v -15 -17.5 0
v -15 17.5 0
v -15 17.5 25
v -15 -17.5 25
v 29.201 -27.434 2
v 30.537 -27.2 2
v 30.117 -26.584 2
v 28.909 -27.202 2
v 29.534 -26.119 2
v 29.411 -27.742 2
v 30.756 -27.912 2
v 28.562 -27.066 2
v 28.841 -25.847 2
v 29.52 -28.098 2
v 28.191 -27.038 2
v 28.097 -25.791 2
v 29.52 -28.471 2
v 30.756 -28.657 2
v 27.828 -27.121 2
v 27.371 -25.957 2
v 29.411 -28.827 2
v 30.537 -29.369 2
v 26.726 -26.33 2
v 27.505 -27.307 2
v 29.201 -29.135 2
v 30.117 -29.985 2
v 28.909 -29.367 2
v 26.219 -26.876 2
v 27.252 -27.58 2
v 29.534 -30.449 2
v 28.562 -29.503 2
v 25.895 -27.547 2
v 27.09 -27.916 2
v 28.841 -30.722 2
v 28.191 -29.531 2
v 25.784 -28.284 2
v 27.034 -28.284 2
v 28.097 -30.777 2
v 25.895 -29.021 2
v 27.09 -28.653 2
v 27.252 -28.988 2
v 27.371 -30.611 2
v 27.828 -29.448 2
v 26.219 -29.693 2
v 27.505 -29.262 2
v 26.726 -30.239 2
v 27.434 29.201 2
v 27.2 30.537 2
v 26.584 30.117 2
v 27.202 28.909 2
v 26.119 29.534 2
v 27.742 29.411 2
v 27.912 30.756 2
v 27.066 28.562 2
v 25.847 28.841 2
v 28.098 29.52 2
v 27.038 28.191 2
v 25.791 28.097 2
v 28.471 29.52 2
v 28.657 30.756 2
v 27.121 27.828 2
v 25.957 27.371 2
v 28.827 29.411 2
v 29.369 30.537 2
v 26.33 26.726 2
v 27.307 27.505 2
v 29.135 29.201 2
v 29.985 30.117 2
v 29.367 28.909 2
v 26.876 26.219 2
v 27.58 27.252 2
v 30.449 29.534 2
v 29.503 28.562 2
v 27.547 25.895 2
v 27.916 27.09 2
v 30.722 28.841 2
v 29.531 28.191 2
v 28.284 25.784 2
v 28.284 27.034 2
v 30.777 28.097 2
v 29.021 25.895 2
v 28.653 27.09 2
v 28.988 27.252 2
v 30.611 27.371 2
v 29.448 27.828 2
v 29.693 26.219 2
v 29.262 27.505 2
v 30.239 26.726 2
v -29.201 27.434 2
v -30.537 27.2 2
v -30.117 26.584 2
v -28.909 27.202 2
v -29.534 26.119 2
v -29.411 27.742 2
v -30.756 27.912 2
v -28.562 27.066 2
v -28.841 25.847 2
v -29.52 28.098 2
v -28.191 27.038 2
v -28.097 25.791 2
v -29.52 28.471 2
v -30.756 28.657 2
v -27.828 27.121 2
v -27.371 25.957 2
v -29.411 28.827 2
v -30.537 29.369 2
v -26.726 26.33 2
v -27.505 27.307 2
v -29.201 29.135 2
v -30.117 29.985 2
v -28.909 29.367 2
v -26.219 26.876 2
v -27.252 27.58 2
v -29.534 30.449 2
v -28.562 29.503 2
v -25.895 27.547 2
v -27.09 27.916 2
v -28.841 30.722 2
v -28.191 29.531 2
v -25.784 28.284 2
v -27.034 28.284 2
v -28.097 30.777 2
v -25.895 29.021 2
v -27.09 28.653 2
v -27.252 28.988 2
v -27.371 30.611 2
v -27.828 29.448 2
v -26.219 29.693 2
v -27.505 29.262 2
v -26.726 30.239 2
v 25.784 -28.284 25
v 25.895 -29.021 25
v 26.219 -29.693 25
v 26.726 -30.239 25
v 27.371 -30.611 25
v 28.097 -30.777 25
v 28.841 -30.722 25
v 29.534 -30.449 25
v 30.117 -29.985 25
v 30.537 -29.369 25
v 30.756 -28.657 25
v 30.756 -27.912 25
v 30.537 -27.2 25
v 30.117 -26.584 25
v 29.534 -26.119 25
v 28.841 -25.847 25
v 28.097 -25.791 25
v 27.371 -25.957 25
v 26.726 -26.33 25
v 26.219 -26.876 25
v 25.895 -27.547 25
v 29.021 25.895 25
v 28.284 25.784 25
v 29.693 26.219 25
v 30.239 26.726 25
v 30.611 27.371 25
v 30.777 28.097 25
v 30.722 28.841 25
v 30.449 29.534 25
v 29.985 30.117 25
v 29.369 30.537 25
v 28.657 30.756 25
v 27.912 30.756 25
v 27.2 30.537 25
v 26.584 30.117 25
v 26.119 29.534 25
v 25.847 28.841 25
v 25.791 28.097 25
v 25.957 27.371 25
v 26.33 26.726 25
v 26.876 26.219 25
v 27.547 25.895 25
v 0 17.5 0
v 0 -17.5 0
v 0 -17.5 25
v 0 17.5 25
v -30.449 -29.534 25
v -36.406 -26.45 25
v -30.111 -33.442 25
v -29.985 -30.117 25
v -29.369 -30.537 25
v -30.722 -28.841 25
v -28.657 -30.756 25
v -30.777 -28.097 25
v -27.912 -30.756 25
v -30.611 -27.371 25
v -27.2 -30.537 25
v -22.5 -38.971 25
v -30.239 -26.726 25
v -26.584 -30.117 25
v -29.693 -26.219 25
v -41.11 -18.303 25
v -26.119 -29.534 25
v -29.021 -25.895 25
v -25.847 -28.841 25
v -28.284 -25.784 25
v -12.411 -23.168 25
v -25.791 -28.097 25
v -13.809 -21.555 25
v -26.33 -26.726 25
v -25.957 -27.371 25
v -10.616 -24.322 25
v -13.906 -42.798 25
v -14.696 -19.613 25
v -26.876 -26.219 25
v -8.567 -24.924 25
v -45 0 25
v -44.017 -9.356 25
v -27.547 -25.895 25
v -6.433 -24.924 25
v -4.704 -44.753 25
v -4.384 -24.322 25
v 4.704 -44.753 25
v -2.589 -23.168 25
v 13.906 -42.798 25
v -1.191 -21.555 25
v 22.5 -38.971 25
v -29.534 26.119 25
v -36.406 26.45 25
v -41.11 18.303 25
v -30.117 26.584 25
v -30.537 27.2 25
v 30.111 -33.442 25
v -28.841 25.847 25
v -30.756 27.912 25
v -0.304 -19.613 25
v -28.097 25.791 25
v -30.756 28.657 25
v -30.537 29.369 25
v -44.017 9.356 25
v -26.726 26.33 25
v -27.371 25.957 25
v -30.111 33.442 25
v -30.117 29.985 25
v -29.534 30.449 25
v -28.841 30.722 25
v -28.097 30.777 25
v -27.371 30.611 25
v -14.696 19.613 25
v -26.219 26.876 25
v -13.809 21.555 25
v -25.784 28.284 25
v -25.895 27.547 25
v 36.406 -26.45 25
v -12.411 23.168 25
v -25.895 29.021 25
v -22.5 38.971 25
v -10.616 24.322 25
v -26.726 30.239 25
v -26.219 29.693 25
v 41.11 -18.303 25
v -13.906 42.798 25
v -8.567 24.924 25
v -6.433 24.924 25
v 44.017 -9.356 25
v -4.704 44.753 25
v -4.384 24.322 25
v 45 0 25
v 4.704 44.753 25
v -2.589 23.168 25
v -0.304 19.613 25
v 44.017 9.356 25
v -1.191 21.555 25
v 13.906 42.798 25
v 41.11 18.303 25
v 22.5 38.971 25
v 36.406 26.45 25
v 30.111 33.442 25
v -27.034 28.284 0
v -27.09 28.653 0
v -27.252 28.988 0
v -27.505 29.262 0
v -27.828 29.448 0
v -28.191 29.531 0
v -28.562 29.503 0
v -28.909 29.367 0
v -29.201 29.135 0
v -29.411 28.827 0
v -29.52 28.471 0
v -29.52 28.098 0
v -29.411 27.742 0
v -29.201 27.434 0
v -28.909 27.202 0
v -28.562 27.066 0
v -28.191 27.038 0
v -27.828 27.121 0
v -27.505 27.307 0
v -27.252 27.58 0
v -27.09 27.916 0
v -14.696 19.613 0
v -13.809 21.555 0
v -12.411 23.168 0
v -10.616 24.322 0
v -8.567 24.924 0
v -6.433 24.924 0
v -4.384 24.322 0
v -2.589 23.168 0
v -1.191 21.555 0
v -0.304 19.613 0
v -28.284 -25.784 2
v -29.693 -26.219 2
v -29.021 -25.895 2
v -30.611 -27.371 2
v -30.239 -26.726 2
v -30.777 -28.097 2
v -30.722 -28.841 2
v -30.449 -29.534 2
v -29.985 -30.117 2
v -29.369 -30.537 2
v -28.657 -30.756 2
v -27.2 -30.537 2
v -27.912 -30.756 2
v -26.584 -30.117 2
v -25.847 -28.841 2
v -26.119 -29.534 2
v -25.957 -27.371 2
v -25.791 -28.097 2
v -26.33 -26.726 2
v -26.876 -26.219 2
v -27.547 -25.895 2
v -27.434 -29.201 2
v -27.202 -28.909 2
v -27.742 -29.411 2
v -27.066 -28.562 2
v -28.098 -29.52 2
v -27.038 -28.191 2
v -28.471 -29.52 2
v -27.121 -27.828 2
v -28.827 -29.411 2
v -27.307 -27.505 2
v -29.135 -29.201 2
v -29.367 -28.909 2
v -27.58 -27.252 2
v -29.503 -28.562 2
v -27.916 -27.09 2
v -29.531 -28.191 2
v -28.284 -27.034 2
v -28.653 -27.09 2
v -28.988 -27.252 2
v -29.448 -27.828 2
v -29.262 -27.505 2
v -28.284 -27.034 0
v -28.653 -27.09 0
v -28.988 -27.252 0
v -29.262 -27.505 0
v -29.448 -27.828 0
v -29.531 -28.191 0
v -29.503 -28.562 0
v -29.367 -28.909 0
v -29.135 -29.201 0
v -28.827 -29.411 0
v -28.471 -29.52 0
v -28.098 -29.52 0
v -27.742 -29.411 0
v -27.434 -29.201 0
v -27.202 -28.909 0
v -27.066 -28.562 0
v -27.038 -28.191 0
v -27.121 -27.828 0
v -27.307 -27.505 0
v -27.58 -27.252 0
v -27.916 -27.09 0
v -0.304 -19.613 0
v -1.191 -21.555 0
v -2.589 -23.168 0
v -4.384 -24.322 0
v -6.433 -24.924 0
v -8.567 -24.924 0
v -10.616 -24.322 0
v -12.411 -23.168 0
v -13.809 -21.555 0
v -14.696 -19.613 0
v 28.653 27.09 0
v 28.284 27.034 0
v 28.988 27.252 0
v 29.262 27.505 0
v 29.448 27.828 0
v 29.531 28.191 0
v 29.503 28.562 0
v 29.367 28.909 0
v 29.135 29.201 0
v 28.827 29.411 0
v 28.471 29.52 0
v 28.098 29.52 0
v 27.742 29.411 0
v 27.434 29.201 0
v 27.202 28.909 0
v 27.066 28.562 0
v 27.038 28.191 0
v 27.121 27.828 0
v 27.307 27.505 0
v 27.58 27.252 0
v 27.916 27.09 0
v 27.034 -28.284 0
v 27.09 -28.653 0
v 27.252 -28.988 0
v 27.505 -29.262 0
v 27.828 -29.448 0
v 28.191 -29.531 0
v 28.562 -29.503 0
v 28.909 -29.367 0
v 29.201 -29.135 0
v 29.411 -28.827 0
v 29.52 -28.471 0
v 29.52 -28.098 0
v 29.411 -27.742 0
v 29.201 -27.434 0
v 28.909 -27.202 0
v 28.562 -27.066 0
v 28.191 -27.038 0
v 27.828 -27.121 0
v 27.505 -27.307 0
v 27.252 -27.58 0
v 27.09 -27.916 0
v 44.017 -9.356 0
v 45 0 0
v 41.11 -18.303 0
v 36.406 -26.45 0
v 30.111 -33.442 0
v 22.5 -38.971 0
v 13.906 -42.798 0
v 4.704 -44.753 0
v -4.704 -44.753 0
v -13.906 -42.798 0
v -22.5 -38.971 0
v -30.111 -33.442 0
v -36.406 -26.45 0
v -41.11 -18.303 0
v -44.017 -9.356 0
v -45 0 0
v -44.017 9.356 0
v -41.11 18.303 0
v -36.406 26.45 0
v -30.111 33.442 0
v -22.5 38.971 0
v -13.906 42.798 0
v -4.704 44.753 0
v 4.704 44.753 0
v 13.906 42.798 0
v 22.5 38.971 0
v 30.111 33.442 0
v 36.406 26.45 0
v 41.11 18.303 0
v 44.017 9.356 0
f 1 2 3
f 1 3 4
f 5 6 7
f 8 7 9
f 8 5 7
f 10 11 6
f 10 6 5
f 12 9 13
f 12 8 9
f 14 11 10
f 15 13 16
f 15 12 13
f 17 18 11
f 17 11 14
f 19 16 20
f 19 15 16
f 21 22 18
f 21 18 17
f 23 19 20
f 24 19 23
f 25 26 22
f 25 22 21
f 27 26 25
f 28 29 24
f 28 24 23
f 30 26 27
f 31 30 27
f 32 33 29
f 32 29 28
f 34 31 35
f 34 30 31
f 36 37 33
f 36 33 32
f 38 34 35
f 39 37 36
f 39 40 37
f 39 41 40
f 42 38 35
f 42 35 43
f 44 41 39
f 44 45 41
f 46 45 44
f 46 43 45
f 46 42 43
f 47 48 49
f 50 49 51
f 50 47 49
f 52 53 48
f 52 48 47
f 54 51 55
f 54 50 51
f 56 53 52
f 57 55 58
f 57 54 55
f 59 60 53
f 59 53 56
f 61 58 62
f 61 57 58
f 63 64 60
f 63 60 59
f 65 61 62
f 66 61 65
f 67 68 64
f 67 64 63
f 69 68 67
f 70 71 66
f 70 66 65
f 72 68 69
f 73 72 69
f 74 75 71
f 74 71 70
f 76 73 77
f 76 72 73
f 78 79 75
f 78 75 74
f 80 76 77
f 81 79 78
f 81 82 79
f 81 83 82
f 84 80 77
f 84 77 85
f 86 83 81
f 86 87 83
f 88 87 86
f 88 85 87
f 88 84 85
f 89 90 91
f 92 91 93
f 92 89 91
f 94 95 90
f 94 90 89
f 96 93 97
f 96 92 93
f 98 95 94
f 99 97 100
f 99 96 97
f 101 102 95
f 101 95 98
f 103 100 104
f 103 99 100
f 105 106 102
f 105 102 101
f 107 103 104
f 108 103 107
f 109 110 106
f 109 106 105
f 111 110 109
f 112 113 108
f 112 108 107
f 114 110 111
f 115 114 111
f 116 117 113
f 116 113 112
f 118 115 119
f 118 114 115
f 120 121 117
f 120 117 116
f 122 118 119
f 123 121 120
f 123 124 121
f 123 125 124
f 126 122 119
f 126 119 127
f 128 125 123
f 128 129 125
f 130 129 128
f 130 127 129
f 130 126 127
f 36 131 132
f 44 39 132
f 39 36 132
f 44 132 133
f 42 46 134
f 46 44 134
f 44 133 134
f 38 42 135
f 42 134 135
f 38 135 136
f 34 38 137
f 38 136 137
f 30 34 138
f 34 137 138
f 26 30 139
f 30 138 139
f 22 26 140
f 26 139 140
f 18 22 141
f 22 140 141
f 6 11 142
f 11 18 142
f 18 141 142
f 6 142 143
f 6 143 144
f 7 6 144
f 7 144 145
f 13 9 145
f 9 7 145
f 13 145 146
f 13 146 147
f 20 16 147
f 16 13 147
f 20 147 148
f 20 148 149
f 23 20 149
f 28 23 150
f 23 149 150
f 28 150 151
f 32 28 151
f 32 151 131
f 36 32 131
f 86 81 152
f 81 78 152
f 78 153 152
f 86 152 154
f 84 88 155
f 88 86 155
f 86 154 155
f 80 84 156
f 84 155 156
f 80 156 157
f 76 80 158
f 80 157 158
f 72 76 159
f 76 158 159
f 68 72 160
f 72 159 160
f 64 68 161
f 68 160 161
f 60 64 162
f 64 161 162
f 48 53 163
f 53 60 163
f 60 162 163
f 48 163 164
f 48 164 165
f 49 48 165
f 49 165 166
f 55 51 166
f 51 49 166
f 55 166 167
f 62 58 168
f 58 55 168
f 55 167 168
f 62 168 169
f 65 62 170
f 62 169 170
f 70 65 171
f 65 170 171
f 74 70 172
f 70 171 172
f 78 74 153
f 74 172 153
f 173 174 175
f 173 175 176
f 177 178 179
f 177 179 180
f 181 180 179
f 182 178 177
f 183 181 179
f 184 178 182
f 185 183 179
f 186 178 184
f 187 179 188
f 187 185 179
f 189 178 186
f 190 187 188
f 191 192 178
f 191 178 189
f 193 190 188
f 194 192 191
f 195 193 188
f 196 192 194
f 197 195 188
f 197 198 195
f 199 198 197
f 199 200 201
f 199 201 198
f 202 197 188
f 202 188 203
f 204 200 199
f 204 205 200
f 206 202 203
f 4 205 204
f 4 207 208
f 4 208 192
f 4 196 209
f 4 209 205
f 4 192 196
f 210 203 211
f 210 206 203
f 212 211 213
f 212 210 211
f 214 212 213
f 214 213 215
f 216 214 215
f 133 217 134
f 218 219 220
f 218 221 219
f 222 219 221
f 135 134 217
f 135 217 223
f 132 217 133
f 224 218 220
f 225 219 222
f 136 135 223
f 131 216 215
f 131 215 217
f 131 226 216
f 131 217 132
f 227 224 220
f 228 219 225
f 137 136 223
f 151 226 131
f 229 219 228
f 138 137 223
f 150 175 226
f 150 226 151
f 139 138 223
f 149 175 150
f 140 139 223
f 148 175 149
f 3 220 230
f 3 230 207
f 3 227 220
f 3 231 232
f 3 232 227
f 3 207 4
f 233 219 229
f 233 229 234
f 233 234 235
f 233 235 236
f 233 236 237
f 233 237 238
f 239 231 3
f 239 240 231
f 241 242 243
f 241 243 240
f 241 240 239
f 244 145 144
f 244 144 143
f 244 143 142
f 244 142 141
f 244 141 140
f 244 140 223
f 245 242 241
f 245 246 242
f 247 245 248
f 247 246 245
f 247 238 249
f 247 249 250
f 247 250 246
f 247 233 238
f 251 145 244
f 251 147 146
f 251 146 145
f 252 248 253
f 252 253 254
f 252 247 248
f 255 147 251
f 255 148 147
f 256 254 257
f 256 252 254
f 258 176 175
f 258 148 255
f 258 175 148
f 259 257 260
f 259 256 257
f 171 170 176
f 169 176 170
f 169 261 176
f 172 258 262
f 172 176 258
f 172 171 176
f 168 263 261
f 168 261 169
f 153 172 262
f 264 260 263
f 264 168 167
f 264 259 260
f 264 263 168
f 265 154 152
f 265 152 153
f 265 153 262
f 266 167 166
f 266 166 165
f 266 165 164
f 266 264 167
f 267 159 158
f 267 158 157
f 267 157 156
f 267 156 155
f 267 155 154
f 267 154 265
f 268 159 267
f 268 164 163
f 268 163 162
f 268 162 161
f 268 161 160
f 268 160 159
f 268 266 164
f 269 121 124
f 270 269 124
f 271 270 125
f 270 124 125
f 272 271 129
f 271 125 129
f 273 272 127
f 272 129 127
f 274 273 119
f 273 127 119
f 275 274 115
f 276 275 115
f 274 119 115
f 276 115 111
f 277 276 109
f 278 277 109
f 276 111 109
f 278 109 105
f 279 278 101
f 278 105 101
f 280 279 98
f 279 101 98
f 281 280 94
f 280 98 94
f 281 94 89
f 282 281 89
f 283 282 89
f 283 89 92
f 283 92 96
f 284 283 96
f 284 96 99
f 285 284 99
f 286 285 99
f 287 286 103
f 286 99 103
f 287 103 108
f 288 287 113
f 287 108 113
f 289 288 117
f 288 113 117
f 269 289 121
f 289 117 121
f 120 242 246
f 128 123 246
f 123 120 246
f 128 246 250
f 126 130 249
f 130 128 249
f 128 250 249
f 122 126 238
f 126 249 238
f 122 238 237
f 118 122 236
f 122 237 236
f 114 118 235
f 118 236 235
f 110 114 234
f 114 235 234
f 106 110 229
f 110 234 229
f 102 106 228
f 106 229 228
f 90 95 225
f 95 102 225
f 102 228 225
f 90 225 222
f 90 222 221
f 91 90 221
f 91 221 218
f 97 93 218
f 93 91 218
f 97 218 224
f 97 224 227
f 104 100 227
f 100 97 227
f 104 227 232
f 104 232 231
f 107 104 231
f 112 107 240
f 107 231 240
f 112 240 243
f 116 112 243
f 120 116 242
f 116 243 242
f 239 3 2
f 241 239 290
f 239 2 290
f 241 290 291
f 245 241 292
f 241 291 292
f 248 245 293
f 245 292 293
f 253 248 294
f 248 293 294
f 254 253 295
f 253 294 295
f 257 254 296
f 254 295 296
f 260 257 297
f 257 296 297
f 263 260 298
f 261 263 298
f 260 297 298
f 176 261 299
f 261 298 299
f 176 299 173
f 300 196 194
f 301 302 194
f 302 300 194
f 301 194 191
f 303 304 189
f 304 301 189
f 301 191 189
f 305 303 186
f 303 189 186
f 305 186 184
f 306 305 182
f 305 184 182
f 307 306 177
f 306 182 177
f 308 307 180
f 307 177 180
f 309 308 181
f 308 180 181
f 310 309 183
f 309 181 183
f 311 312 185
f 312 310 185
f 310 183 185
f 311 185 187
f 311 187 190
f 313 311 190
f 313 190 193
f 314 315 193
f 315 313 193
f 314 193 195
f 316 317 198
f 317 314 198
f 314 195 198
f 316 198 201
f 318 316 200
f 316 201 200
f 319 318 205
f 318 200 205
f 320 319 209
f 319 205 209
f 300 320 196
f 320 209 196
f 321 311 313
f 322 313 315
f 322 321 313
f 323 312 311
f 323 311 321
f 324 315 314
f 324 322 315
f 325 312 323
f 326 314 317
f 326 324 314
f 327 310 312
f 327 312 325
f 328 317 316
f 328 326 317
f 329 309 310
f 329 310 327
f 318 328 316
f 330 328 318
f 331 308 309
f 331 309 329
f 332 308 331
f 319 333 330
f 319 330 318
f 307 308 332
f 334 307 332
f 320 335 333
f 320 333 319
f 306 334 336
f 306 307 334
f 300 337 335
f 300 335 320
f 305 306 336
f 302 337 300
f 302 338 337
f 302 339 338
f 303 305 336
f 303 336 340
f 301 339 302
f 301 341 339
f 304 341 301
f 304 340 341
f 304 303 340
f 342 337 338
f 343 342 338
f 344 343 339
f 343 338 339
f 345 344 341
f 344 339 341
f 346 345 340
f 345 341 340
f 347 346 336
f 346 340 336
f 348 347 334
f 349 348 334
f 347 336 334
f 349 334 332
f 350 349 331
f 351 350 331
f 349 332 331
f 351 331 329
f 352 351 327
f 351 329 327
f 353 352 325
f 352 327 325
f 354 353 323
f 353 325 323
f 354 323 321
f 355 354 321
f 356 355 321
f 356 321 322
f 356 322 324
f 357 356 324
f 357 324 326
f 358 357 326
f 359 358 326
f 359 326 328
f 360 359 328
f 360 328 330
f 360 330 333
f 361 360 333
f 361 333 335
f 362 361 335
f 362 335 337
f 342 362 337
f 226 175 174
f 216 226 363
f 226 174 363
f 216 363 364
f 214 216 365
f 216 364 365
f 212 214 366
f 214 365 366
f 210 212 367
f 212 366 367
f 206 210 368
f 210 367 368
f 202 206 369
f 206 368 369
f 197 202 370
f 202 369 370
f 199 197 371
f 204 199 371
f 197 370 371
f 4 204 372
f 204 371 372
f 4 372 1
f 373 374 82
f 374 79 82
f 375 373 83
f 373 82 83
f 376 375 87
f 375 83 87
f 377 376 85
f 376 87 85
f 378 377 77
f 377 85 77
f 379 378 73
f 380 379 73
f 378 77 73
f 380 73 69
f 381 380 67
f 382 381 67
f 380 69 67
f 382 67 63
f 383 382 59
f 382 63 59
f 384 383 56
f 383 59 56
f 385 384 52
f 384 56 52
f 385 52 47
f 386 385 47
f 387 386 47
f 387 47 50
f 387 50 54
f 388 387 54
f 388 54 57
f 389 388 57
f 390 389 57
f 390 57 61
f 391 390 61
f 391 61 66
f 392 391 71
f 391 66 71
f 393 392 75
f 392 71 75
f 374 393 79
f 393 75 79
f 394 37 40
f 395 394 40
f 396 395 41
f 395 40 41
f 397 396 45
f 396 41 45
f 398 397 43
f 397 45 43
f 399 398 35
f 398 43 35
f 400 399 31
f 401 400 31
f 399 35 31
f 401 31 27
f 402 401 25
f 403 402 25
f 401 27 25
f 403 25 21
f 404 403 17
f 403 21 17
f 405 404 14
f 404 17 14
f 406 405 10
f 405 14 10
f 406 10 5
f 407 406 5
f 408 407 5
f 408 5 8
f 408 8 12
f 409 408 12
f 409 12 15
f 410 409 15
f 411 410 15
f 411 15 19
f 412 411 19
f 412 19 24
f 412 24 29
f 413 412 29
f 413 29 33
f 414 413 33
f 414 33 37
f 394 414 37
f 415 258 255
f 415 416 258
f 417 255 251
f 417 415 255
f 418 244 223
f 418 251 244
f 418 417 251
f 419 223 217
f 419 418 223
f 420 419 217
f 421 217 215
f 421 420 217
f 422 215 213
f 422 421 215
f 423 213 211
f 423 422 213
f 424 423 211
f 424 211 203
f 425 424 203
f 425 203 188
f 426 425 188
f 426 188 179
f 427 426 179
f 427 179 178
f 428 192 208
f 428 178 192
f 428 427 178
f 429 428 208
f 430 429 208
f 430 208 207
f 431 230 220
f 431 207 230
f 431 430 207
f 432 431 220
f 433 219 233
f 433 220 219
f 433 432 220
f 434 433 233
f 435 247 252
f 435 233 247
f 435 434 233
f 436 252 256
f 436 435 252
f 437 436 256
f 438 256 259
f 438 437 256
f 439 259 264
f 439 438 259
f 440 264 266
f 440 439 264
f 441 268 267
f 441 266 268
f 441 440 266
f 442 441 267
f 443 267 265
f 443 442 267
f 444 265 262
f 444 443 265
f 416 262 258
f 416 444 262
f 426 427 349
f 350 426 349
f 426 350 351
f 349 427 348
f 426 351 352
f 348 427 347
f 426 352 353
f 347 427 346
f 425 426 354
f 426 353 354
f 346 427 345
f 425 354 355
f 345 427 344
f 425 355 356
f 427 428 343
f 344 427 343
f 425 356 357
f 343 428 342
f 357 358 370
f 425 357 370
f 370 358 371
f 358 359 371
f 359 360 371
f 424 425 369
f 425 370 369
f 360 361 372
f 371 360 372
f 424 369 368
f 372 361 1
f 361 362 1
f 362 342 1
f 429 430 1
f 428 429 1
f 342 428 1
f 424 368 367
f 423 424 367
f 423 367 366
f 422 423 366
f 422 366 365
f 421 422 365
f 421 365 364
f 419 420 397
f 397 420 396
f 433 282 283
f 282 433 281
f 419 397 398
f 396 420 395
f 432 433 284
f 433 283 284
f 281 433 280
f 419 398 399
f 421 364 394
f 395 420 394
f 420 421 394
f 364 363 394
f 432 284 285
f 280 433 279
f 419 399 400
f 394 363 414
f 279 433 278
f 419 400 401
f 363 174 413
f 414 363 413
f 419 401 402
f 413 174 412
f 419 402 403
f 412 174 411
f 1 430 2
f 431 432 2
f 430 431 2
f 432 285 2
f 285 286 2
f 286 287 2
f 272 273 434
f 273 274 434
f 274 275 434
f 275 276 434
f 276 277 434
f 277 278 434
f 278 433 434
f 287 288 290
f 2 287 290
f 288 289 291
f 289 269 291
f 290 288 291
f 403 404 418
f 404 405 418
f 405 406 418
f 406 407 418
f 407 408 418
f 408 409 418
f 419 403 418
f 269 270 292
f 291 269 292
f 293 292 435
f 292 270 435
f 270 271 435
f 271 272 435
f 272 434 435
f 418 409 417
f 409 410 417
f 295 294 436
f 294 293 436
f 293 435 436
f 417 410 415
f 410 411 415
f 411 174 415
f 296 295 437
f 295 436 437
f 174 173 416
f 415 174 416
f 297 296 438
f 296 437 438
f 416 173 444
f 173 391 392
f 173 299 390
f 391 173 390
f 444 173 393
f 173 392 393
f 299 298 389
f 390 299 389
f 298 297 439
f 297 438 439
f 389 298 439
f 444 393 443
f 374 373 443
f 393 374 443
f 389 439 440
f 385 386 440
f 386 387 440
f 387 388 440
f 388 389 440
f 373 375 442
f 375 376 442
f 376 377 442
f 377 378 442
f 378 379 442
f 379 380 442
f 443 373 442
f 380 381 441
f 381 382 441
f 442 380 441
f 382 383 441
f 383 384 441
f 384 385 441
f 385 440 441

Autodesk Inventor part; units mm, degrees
ref_plane "YZ Plane" through (0, 0, 0) normal (1, 0, 0) x (0, 1, 0)
ref_plane "XZ Plane" through (0, 0, 0) normal (0, 1, 0) x (-1, 0, 0)
ref_plane "XY Plane" through (0, 0, 0) normal (0, 0, 1) x (1, 0, 0)
sketch "Sketch1" plane through (0, 0, 0) normal (0, 0, 1) x (1, 0, 0)
  circle A0 centre (0, 0) radius 45
  line L0 (-7.5, 25) -> (-7.5, 25)
  line L1 (-15, 17.5) -> (-15, -17.5)
  line L2 (-7.5, -25) -> (-7.5, -25)
  line L3 (0, -17.5) -> (0, 17.5)
  arc A1 (-7.5, 25) -> (-15, 17.5) centre (-7.5, 17.5) ccw
  arc A2 (-15, -17.5) -> (-7.5, -25) centre (-7.5, -17.5) ccw
  arc A3 (-7.5, -25) -> (0, -17.5) centre (-7.5, -17.5) ccw
  arc A4 (0, 17.5) -> (-7.5, 25) centre (-7.5, 17.5) ccw
  point P0 (-15, -25)
  point P1 (-15, 25)
  point P2 (0, -25)
  dimension "d0" = 90
  dimension "d1" = 15
  dimension "d2" = 50
  dimension "d3" = 7.5
  dimension "d4" = 25
  dimension "d5" = 0
extrude "Extrusion1" add sketch "Sketch1" along normal blind 25
sketch "Sketch2" plane through (0, 0, 25) normal (0, 0, 1) x (1, 0, 0)
  line L0 (0, 0) -> (-28.2843, 28.2843)
  line L1 (0, 0) -> (40, 0) construction
  circle A0 centre (-28.2843, 28.2843) radius 2.5
  dimension "d8" = 40
  dimension "d9" = 135
  dimension "d10" = 5
extrude "Extrusion2" cut sketch "Sketch2" against normal blind 23
pattern_circular "Circular Pattern1" count 4 over 360 about axis through (0, 0, 0) along (0, 0, 1) of "Extrusion2"
sketch "Sketch3" plane through (-28.2843, 28.2843, 2) normal (0, 0, 1) x (1, 0, 0)
  circle A0 centre (0, 0) radius 1.25
  point P0 (28.2843, -28.2843)
  dimension "d16" = 2.5
extrude "Extrusion3" cut sketch "Sketch3" against normal blind 3
pattern_circular "Circular Pattern2" count 4 over 360 about axis through (0, 0, 0) along (0, 0, 1) of "Extrusion3"
properties part number "Arm Plate"
